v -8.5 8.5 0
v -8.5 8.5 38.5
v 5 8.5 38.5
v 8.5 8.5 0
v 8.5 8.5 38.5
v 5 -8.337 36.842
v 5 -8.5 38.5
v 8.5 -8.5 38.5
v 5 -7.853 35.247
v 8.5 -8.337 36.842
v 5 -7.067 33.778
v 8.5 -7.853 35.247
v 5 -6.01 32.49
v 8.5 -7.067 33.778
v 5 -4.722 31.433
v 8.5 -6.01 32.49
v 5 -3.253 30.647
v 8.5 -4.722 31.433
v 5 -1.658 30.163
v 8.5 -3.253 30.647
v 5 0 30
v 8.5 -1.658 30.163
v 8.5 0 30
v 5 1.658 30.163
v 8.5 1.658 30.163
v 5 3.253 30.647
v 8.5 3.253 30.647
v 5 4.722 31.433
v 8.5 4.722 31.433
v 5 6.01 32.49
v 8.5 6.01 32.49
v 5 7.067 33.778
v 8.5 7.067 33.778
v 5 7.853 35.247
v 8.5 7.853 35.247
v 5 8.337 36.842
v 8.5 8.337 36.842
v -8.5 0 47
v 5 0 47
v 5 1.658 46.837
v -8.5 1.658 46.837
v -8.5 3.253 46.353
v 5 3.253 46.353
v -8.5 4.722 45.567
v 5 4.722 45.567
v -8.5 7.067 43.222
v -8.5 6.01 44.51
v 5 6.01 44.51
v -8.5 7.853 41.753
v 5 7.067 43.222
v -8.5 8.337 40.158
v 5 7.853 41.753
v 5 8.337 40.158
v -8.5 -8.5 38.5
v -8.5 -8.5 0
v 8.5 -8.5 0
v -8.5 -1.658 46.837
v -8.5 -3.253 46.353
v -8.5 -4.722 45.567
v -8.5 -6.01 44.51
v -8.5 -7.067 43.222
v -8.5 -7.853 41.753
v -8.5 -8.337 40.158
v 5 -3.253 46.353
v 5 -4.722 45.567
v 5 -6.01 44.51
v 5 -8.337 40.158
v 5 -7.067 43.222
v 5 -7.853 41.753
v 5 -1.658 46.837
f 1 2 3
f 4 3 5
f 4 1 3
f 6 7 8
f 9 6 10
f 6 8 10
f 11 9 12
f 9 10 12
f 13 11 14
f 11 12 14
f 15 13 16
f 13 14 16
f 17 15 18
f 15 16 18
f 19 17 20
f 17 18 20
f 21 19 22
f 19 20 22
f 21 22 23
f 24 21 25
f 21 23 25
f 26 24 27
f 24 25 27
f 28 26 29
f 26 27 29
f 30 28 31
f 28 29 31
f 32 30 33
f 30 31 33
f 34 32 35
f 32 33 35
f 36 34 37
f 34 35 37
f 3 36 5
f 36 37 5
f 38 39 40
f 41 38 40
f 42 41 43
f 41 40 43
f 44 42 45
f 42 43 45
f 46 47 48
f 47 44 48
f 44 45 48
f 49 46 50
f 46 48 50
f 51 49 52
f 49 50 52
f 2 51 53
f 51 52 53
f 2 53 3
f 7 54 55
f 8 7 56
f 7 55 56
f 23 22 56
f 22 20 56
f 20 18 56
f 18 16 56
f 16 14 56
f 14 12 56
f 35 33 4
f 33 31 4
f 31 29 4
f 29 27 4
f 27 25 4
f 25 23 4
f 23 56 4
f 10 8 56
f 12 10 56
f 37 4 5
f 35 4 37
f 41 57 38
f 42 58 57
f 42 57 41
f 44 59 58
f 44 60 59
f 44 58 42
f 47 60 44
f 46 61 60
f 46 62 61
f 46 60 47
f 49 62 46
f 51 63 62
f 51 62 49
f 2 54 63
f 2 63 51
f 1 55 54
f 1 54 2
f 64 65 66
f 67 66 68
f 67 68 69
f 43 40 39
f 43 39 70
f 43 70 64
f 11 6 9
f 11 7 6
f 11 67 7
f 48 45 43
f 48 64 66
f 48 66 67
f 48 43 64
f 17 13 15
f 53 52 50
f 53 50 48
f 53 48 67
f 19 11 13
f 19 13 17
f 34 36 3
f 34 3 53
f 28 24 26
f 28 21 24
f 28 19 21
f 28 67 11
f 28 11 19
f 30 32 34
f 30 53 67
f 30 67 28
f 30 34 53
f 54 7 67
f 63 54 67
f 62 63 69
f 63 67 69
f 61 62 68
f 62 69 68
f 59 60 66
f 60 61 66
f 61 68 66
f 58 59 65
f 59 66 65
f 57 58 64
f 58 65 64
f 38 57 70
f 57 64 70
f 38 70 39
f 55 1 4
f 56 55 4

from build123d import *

# Parameters (mm, degrees)
SKETCH2_W           = 17
SKETCH2_H           = 17
BOSS_EXTRUDE1_DEPTH = 47
CUT_EXTRUDE1_DEPTH  = 47
SKETCH6_R           = 8.5
CUT_EXTRUDE3_DEPTH  = 3.5


with BuildPart() as part:
    # Sketch2 → Boss-Extrude1 (new body)
    with BuildSketch(Plane.XY):
        Rectangle(SKETCH2_W, SKETCH2_H)
    extrude(amount=BOSS_EXTRUDE1_DEPTH)

    # Sketch3 → Cut-Extrude1 (cut)
    with BuildSketch(Plane(origin=(8.5, 0, 0), x_dir=(0, 0, -1), z_dir=(1, 0, 0))):
        with BuildLine():
            Line((-38.5, 8.5), (-47, 8.5))
            Line((-47, 8.5), (-47, 0))
            ThreePointArc((-47, 0), (-44.51040764, 6.01040764), (-38.5, 8.5))
        make_face()
        with BuildLine():
            ThreePointArc((-38.5, -8.5), (-44.51040764, -6.01040764), (-47, 0))
            Line((-47, 0), (-47, -8.5))
            Line((-47, -8.5), (-38.5, -8.5))
        make_face()
    extrude(amount=-CUT_EXTRUDE1_DEPTH, mode=Mode.SUBTRACT)

    # Sketch6 → Cut-Extrude3 (cut)
    with BuildSketch(Plane(origin=(8.5, 0, 0), x_dir=(0, 0, -1), z_dir=(1, 0, 0))):
        with Locations((-38.5, 0)):
            Circle(SKETCH6_R)
    extrude(amount=-CUT_EXTRUDE3_DEPTH, mode=Mode.SUBTRACT)


solid = part.part
